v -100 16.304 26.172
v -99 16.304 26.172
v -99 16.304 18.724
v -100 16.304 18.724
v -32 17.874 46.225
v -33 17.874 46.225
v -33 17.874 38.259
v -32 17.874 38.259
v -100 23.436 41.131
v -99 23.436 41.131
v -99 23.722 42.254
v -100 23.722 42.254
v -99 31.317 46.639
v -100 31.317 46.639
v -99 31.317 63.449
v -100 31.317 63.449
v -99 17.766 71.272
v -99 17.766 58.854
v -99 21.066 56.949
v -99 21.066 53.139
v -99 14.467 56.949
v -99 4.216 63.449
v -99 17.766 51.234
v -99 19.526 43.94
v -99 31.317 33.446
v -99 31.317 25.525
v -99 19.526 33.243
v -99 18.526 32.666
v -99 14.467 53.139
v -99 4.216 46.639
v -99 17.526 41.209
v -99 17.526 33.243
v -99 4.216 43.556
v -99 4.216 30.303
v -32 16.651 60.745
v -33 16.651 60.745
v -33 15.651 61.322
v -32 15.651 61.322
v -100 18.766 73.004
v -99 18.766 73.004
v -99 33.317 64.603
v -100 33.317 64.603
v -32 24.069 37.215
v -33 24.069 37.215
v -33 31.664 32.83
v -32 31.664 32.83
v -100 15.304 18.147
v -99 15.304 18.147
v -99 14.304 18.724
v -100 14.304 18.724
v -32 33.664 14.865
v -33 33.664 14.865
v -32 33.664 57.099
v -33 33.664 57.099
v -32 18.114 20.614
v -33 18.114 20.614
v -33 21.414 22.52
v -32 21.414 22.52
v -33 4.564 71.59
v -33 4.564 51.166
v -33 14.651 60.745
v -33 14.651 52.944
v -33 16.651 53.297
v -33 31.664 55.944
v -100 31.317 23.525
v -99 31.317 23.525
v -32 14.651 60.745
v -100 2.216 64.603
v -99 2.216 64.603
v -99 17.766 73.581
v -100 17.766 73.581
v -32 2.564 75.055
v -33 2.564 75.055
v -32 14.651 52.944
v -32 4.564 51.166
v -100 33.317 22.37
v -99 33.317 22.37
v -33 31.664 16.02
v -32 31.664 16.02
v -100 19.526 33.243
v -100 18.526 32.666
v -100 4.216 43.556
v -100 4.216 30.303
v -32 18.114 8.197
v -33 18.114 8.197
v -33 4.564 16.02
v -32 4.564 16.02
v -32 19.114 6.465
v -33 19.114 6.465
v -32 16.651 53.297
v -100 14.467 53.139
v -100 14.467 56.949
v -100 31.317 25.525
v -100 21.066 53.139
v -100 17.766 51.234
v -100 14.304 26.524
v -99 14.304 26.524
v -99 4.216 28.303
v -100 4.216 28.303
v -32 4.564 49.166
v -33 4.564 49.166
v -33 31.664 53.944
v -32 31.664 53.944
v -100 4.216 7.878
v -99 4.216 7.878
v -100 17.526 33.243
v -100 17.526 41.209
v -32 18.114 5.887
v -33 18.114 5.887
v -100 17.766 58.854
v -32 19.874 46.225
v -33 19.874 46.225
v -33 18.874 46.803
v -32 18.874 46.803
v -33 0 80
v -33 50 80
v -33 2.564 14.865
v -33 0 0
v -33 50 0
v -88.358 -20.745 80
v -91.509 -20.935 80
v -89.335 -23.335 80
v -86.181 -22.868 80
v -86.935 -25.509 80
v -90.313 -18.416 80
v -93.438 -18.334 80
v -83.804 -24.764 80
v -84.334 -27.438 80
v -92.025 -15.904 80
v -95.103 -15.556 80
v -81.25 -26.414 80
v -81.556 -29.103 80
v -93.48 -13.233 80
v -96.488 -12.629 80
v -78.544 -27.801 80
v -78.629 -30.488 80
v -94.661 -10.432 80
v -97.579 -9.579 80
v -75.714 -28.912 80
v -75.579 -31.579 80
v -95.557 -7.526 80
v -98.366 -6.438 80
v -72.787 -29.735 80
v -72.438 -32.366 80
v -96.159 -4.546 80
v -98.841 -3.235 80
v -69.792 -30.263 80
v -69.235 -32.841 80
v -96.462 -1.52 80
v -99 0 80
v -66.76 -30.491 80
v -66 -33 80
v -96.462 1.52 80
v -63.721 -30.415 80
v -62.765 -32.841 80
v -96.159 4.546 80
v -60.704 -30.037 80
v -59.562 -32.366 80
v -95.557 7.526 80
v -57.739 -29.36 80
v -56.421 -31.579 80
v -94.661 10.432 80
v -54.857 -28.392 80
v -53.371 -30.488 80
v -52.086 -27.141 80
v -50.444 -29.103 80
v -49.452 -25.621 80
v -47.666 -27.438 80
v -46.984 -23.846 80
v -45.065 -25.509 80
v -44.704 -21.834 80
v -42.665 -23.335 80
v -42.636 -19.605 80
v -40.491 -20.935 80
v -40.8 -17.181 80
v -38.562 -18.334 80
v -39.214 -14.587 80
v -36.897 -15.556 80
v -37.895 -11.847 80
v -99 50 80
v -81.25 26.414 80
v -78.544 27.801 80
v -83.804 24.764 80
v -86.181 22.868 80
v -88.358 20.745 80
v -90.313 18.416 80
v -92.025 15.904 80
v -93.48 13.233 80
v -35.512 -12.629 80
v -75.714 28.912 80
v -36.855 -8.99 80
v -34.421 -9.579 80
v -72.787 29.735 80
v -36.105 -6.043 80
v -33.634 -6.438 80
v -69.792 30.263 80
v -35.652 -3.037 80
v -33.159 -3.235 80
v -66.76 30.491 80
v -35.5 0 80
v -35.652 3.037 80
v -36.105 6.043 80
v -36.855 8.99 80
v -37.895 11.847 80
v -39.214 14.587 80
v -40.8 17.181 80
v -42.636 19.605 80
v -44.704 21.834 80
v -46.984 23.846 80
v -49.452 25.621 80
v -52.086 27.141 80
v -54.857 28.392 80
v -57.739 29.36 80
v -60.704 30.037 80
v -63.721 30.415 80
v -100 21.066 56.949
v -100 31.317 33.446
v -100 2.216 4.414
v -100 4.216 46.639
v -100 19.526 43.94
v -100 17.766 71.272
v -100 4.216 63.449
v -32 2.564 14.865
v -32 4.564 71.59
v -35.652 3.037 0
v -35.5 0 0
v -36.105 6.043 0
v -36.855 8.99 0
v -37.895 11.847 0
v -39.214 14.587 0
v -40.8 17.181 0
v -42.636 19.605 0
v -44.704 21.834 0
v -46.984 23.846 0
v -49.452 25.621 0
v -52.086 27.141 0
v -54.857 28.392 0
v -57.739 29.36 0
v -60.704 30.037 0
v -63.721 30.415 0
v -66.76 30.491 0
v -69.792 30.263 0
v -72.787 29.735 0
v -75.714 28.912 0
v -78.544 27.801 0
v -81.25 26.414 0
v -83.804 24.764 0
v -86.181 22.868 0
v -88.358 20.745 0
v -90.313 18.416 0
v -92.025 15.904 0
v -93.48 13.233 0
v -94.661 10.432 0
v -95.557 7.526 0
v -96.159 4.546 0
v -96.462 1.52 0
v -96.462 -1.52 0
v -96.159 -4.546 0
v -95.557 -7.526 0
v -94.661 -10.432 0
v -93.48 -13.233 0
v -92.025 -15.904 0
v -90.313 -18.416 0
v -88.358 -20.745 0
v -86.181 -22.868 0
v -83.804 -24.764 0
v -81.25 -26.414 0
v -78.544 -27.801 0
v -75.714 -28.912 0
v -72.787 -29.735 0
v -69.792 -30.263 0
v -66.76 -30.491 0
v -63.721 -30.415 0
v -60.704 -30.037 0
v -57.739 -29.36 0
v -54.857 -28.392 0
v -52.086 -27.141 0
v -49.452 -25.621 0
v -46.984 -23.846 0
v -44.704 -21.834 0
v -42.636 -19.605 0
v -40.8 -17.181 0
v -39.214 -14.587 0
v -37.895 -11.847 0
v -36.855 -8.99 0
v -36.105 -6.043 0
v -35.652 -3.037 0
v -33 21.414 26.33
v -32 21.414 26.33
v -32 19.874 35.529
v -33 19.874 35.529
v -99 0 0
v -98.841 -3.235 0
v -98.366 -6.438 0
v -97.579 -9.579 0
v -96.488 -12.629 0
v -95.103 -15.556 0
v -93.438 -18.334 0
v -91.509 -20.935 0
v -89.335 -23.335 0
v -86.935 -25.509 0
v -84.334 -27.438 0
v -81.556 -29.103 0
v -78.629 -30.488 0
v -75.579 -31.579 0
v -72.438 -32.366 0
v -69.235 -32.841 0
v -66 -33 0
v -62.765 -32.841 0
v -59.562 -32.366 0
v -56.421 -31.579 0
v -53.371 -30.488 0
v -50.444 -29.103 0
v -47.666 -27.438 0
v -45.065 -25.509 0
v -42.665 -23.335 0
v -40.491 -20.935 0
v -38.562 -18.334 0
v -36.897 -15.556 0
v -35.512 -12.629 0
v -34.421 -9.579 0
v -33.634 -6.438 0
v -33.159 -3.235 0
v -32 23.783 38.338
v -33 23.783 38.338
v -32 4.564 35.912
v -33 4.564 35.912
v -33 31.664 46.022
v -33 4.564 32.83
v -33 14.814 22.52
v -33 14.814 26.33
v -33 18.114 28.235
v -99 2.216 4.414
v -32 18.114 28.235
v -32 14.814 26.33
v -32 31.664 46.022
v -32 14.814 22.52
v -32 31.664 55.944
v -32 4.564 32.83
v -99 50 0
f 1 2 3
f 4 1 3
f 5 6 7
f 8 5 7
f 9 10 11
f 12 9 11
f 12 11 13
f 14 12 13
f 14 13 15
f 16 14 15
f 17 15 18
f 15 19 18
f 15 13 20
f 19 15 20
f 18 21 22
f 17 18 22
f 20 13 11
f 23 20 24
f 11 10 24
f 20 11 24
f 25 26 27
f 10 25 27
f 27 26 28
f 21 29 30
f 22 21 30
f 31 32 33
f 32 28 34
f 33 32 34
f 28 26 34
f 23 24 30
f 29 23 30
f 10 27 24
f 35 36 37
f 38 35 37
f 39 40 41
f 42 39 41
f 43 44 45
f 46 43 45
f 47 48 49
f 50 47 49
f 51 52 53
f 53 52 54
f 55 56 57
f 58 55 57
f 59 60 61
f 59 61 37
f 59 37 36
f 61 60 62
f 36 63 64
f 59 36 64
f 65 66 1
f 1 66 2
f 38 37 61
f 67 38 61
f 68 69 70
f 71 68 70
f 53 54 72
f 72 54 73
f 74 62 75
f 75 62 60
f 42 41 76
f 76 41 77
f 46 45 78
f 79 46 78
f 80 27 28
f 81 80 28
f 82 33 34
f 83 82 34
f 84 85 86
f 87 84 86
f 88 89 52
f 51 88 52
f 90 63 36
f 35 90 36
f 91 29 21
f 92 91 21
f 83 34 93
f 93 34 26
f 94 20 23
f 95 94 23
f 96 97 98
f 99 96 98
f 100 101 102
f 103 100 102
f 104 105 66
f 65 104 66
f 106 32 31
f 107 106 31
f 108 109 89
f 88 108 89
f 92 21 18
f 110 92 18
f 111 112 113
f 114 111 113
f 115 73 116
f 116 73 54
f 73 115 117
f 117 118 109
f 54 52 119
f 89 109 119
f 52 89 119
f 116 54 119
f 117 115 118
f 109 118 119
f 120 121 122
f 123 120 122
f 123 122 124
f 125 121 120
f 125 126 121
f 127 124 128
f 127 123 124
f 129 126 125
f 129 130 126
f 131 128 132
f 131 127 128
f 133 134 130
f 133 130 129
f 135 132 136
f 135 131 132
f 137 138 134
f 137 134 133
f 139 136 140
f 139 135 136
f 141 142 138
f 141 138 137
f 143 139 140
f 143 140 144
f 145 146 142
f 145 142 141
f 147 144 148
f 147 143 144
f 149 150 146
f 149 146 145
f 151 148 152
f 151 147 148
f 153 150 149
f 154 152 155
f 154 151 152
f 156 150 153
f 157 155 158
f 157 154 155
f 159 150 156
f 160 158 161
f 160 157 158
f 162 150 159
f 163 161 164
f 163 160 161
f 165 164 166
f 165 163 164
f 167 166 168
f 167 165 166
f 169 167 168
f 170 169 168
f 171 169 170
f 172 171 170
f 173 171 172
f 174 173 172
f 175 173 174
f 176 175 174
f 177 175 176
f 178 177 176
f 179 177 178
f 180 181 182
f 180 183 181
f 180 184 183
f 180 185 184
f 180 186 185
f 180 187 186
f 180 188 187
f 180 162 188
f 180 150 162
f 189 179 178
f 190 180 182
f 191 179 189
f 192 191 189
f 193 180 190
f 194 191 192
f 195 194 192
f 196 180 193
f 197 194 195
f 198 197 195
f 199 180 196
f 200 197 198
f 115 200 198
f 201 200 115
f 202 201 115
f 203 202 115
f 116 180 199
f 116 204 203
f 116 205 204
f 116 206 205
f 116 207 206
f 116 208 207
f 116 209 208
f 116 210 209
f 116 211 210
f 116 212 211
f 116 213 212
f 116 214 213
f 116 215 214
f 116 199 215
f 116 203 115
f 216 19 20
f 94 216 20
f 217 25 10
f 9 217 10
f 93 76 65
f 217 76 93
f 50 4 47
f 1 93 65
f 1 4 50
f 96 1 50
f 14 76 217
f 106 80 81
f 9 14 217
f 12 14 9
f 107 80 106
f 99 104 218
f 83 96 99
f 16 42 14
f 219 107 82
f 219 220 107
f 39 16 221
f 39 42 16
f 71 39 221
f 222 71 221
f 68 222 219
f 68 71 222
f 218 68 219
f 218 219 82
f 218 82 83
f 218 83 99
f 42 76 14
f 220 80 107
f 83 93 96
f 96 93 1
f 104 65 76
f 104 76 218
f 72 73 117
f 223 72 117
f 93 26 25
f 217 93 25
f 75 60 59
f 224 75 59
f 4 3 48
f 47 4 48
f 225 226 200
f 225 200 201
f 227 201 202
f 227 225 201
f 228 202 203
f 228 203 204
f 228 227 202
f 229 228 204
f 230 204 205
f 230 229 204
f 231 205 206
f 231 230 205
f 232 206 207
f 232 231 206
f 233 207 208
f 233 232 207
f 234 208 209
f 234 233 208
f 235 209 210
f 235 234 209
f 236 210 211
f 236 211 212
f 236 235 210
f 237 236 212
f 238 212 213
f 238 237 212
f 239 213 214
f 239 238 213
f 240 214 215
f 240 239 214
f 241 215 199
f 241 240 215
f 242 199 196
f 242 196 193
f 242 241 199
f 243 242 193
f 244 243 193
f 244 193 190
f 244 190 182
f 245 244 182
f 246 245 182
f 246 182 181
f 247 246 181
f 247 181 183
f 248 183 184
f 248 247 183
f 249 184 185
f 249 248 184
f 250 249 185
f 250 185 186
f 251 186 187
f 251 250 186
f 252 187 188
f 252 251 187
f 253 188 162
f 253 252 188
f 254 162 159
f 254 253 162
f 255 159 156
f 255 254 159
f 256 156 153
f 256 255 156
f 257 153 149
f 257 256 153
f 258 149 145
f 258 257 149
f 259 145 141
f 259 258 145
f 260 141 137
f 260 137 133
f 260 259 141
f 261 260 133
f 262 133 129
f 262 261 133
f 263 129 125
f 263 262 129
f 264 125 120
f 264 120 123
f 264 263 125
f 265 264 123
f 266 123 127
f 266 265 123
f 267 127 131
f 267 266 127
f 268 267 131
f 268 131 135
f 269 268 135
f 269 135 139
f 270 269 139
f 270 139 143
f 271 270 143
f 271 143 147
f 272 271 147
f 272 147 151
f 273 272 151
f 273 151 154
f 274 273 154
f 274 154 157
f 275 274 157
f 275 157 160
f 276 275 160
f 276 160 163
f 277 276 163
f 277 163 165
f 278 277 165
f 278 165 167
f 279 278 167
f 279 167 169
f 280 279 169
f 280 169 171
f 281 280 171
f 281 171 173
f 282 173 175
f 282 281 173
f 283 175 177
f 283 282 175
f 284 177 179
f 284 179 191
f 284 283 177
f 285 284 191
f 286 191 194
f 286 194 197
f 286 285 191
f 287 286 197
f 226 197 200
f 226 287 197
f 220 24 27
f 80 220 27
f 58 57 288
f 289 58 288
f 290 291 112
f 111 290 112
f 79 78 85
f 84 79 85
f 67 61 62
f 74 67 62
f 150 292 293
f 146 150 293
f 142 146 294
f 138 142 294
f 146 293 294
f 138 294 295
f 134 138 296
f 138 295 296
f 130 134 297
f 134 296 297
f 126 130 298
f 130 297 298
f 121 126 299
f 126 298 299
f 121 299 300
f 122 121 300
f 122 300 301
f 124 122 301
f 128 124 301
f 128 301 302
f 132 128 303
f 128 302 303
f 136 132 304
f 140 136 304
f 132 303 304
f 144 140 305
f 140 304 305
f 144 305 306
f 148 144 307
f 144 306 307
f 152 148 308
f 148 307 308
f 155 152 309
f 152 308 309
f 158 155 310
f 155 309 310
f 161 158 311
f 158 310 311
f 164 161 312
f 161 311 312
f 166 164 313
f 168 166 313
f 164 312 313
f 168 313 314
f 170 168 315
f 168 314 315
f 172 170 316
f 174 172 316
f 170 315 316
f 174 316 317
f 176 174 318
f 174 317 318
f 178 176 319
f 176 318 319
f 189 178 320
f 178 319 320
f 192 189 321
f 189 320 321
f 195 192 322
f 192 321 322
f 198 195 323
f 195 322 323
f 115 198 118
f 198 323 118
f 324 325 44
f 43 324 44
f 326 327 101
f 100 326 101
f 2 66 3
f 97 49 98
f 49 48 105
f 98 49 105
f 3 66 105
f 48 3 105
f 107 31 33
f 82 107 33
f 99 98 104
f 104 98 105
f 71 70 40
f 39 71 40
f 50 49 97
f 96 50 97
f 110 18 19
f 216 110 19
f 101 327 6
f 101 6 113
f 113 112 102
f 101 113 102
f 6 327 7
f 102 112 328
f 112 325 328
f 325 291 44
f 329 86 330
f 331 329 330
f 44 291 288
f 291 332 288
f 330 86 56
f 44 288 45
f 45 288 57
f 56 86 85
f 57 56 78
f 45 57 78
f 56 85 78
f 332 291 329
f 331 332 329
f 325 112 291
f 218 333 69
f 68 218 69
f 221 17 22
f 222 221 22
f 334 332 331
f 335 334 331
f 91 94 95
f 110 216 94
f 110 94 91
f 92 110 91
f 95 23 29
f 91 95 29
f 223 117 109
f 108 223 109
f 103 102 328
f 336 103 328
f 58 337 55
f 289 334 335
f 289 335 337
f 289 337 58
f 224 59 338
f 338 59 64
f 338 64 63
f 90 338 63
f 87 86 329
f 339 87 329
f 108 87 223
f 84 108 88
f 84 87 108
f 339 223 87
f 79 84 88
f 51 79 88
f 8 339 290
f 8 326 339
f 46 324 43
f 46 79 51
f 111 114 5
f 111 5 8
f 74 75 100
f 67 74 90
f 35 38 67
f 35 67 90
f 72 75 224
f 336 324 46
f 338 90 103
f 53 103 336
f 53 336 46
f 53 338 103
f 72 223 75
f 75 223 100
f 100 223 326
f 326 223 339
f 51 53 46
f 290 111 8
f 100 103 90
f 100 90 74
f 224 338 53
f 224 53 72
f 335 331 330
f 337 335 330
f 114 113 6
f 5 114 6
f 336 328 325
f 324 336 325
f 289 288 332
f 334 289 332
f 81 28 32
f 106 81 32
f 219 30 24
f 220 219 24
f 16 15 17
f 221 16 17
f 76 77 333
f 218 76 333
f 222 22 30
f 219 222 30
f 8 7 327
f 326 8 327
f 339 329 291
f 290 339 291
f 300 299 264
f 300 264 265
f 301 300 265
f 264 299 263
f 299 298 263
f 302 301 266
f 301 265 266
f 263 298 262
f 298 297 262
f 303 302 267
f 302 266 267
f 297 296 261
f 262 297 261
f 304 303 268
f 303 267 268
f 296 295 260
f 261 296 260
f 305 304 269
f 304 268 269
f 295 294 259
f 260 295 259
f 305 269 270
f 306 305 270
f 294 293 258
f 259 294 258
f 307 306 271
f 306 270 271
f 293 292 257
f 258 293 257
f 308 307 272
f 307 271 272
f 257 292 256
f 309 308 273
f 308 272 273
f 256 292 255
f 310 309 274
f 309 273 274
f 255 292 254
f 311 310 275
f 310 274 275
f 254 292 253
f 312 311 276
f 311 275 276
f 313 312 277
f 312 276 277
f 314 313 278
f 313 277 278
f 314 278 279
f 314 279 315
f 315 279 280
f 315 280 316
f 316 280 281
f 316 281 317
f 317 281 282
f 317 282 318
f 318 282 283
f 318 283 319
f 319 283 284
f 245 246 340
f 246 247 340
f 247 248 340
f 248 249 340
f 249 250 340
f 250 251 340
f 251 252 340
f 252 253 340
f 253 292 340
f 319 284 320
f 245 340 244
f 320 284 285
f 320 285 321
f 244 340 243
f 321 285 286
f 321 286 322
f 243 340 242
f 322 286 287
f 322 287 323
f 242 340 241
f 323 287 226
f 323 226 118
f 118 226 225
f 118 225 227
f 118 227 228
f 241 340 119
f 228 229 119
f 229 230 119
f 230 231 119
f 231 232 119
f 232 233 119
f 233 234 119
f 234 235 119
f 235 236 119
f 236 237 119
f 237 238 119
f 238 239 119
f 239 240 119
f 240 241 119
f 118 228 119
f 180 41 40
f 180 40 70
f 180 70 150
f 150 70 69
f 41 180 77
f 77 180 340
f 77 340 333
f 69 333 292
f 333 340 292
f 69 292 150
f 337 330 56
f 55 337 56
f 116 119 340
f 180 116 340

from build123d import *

# Parameters (mm, degrees)
F5_R     = 30.5
F5_W     = 20
F5_H     = 15
F0_DEPTH = 80
F2_DEPTH = 1
F4_DEPTH = 1


with BuildPart() as f0:
    # F5 (on Top) → F0 (new body)
    with BuildSketch(Plane.XY):
        with BuildLine():
            ThreePointArc((-99, 0), (-66, 33), (-33, 0))
            Line((-33, 0), (-33, 50))
            Line((-33, 50), (-79, 50))
            Line((-79, 50), (-79, 35))
            Line((-79, 35), (-99, 35))
            Line((-99, 35), (-99, 0))
        make_face()
        with BuildLine():
            ThreePointArc((-99, 0), (-66, -33), (-33, 0))
            ThreePointArc((-33, 0), (-66, 33), (-99, 0))
        make_face()
        with Locations((-66, 0)):
            Circle(F5_R, mode=Mode.SUBTRACT)
        with Locations((-89, 42.5)):
            Rectangle(F5_W, F5_H)
    extrude(amount=F0_DEPTH)

    # F1 (on face) → F2 (join)
    with BuildSketch(Plane.YZ.offset(-33)):
        Polygon((33.663927, 32.829516), (33.663927, 57.098736), (2.563593, 75.054523), (2.563593, 51.653499), (2.563593, 14.865377), (18.11376, 5.887484), (19.11376, 6.464834), (33.663927, 14.865377), (33.663927, 15.595676), align=None)
        Polygon((4.563593, 51.165515), (4.563593, 71.590421), (31.663927, 55.944036), (31.663927, 53.944036), (31.663927, 46.022312), (31.663927, 43.27108), (31.663927, 32.829516), (31.663927, 16.020077), (18.11376, 8.196885), (4.563593, 16.020077), (4.563593, 32.829516), (4.563593, 35.912469), (4.563593, 36.259414), (4.563593, 38.259414), (4.563593, 49.165515), align=None, mode=Mode.SUBTRACT)
        Polygon((14.651485, 52.944283), (4.563593, 51.165515), (4.563593, 49.165515), (31.663927, 53.944036), (31.663927, 55.944036), (16.651485, 53.296937), align=None)
        Polygon((14.651485, 60.74453), (14.651485, 52.944283), (16.651485, 53.296937), (16.651485, 60.74453), (15.651485, 61.32188), align=None)
        Polygon((17.873782, 38.259414), (4.563593, 35.912469), (4.563593, 32.829516), (19.873782, 35.529115), (19.873782, 46.225284), (18.873782, 46.802635), (17.873782, 46.225284), align=None)
        Polygon((31.663927, 43.27108), (31.663927, 46.022312), (23.782982, 38.337872), (24.068827, 37.214549), (25.17923, 36.905919), align=None)
        Polygon((31.663927, 32.829516), (31.663927, 43.27108), (25.17923, 36.905919), (24.068827, 37.214549), align=None)
        Polygon((21.413582, 22.519643), (21.413582, 26.32995), (18.11376, 28.235103), (14.813938, 26.32995), (14.813938, 22.519643), (18.11376, 20.61449), align=None)
    extrude(amount=F2_DEPTH)

    # F3 (on face) → F4 (join)
    with BuildSketch(Plane(origin=(-99, 0, 0), x_dir=(0, -1, 0), z_dir=(-1, 0, 0))):
        Polygon((-33.316614, 46.639109), (-33.316614, 22.369889), (-2.216279, 4.414102), (-2.216279, 27.815126), (-2.216279, 64.603248), (-17.766446, 73.581141), (-18.766446, 73.003791), (-33.316614, 64.603248), (-33.316614, 63.872949), align=None)
        Polygon((-4.216279, 28.303109), (-4.216279, 7.878204), (-31.316614, 23.524589), (-31.316614, 25.524589), (-31.316614, 33.446313), (-31.316614, 36.197545), (-31.316614, 46.639109), (-31.316614, 63.448548), (-17.766446, 71.27174), (-4.216279, 63.448548), (-4.216279, 46.639109), (-4.216279, 43.556156), (-4.216279, 43.209211), (-4.216279, 41.209211), (-4.216279, 30.303109), align=None, mode=Mode.SUBTRACT)
        Polygon((-17.526468, 41.209211), (-4.216279, 43.556156), (-4.216279, 46.639109), (-19.526468, 43.939509), (-19.526468, 33.243341), (-18.526468, 32.66599), (-17.526468, 33.243341), align=None)
        Polygon((-31.316614, 36.197545), (-31.316614, 33.446313), (-23.435668, 41.130753), (-23.721513, 42.254076), (-24.831917, 42.562706), align=None)
        Polygon((-31.316614, 46.639109), (-31.316614, 36.197545), (-24.831917, 42.562706), (-23.721513, 42.254076), align=None)
        Polygon((-21.066269, 56.948982), (-21.066269, 53.138675), (-17.766446, 51.233521), (-14.466624, 53.138675), (-14.466624, 56.948982), (-17.766446, 58.854135), align=None)
        Polygon((-14.304171, 26.524342), (-4.216279, 28.303109), (-4.216279, 30.303109), (-31.316614, 25.524589), (-31.316614, 23.524589), (-16.304171, 26.171688), align=None)
        Polygon((-14.304171, 18.724095), (-14.304171, 26.524342), (-16.304171, 26.171688), (-16.304171, 18.724095), (-15.304171, 18.146745), align=None)
    extrude(amount=F4_DEPTH)


solid = f0.part
